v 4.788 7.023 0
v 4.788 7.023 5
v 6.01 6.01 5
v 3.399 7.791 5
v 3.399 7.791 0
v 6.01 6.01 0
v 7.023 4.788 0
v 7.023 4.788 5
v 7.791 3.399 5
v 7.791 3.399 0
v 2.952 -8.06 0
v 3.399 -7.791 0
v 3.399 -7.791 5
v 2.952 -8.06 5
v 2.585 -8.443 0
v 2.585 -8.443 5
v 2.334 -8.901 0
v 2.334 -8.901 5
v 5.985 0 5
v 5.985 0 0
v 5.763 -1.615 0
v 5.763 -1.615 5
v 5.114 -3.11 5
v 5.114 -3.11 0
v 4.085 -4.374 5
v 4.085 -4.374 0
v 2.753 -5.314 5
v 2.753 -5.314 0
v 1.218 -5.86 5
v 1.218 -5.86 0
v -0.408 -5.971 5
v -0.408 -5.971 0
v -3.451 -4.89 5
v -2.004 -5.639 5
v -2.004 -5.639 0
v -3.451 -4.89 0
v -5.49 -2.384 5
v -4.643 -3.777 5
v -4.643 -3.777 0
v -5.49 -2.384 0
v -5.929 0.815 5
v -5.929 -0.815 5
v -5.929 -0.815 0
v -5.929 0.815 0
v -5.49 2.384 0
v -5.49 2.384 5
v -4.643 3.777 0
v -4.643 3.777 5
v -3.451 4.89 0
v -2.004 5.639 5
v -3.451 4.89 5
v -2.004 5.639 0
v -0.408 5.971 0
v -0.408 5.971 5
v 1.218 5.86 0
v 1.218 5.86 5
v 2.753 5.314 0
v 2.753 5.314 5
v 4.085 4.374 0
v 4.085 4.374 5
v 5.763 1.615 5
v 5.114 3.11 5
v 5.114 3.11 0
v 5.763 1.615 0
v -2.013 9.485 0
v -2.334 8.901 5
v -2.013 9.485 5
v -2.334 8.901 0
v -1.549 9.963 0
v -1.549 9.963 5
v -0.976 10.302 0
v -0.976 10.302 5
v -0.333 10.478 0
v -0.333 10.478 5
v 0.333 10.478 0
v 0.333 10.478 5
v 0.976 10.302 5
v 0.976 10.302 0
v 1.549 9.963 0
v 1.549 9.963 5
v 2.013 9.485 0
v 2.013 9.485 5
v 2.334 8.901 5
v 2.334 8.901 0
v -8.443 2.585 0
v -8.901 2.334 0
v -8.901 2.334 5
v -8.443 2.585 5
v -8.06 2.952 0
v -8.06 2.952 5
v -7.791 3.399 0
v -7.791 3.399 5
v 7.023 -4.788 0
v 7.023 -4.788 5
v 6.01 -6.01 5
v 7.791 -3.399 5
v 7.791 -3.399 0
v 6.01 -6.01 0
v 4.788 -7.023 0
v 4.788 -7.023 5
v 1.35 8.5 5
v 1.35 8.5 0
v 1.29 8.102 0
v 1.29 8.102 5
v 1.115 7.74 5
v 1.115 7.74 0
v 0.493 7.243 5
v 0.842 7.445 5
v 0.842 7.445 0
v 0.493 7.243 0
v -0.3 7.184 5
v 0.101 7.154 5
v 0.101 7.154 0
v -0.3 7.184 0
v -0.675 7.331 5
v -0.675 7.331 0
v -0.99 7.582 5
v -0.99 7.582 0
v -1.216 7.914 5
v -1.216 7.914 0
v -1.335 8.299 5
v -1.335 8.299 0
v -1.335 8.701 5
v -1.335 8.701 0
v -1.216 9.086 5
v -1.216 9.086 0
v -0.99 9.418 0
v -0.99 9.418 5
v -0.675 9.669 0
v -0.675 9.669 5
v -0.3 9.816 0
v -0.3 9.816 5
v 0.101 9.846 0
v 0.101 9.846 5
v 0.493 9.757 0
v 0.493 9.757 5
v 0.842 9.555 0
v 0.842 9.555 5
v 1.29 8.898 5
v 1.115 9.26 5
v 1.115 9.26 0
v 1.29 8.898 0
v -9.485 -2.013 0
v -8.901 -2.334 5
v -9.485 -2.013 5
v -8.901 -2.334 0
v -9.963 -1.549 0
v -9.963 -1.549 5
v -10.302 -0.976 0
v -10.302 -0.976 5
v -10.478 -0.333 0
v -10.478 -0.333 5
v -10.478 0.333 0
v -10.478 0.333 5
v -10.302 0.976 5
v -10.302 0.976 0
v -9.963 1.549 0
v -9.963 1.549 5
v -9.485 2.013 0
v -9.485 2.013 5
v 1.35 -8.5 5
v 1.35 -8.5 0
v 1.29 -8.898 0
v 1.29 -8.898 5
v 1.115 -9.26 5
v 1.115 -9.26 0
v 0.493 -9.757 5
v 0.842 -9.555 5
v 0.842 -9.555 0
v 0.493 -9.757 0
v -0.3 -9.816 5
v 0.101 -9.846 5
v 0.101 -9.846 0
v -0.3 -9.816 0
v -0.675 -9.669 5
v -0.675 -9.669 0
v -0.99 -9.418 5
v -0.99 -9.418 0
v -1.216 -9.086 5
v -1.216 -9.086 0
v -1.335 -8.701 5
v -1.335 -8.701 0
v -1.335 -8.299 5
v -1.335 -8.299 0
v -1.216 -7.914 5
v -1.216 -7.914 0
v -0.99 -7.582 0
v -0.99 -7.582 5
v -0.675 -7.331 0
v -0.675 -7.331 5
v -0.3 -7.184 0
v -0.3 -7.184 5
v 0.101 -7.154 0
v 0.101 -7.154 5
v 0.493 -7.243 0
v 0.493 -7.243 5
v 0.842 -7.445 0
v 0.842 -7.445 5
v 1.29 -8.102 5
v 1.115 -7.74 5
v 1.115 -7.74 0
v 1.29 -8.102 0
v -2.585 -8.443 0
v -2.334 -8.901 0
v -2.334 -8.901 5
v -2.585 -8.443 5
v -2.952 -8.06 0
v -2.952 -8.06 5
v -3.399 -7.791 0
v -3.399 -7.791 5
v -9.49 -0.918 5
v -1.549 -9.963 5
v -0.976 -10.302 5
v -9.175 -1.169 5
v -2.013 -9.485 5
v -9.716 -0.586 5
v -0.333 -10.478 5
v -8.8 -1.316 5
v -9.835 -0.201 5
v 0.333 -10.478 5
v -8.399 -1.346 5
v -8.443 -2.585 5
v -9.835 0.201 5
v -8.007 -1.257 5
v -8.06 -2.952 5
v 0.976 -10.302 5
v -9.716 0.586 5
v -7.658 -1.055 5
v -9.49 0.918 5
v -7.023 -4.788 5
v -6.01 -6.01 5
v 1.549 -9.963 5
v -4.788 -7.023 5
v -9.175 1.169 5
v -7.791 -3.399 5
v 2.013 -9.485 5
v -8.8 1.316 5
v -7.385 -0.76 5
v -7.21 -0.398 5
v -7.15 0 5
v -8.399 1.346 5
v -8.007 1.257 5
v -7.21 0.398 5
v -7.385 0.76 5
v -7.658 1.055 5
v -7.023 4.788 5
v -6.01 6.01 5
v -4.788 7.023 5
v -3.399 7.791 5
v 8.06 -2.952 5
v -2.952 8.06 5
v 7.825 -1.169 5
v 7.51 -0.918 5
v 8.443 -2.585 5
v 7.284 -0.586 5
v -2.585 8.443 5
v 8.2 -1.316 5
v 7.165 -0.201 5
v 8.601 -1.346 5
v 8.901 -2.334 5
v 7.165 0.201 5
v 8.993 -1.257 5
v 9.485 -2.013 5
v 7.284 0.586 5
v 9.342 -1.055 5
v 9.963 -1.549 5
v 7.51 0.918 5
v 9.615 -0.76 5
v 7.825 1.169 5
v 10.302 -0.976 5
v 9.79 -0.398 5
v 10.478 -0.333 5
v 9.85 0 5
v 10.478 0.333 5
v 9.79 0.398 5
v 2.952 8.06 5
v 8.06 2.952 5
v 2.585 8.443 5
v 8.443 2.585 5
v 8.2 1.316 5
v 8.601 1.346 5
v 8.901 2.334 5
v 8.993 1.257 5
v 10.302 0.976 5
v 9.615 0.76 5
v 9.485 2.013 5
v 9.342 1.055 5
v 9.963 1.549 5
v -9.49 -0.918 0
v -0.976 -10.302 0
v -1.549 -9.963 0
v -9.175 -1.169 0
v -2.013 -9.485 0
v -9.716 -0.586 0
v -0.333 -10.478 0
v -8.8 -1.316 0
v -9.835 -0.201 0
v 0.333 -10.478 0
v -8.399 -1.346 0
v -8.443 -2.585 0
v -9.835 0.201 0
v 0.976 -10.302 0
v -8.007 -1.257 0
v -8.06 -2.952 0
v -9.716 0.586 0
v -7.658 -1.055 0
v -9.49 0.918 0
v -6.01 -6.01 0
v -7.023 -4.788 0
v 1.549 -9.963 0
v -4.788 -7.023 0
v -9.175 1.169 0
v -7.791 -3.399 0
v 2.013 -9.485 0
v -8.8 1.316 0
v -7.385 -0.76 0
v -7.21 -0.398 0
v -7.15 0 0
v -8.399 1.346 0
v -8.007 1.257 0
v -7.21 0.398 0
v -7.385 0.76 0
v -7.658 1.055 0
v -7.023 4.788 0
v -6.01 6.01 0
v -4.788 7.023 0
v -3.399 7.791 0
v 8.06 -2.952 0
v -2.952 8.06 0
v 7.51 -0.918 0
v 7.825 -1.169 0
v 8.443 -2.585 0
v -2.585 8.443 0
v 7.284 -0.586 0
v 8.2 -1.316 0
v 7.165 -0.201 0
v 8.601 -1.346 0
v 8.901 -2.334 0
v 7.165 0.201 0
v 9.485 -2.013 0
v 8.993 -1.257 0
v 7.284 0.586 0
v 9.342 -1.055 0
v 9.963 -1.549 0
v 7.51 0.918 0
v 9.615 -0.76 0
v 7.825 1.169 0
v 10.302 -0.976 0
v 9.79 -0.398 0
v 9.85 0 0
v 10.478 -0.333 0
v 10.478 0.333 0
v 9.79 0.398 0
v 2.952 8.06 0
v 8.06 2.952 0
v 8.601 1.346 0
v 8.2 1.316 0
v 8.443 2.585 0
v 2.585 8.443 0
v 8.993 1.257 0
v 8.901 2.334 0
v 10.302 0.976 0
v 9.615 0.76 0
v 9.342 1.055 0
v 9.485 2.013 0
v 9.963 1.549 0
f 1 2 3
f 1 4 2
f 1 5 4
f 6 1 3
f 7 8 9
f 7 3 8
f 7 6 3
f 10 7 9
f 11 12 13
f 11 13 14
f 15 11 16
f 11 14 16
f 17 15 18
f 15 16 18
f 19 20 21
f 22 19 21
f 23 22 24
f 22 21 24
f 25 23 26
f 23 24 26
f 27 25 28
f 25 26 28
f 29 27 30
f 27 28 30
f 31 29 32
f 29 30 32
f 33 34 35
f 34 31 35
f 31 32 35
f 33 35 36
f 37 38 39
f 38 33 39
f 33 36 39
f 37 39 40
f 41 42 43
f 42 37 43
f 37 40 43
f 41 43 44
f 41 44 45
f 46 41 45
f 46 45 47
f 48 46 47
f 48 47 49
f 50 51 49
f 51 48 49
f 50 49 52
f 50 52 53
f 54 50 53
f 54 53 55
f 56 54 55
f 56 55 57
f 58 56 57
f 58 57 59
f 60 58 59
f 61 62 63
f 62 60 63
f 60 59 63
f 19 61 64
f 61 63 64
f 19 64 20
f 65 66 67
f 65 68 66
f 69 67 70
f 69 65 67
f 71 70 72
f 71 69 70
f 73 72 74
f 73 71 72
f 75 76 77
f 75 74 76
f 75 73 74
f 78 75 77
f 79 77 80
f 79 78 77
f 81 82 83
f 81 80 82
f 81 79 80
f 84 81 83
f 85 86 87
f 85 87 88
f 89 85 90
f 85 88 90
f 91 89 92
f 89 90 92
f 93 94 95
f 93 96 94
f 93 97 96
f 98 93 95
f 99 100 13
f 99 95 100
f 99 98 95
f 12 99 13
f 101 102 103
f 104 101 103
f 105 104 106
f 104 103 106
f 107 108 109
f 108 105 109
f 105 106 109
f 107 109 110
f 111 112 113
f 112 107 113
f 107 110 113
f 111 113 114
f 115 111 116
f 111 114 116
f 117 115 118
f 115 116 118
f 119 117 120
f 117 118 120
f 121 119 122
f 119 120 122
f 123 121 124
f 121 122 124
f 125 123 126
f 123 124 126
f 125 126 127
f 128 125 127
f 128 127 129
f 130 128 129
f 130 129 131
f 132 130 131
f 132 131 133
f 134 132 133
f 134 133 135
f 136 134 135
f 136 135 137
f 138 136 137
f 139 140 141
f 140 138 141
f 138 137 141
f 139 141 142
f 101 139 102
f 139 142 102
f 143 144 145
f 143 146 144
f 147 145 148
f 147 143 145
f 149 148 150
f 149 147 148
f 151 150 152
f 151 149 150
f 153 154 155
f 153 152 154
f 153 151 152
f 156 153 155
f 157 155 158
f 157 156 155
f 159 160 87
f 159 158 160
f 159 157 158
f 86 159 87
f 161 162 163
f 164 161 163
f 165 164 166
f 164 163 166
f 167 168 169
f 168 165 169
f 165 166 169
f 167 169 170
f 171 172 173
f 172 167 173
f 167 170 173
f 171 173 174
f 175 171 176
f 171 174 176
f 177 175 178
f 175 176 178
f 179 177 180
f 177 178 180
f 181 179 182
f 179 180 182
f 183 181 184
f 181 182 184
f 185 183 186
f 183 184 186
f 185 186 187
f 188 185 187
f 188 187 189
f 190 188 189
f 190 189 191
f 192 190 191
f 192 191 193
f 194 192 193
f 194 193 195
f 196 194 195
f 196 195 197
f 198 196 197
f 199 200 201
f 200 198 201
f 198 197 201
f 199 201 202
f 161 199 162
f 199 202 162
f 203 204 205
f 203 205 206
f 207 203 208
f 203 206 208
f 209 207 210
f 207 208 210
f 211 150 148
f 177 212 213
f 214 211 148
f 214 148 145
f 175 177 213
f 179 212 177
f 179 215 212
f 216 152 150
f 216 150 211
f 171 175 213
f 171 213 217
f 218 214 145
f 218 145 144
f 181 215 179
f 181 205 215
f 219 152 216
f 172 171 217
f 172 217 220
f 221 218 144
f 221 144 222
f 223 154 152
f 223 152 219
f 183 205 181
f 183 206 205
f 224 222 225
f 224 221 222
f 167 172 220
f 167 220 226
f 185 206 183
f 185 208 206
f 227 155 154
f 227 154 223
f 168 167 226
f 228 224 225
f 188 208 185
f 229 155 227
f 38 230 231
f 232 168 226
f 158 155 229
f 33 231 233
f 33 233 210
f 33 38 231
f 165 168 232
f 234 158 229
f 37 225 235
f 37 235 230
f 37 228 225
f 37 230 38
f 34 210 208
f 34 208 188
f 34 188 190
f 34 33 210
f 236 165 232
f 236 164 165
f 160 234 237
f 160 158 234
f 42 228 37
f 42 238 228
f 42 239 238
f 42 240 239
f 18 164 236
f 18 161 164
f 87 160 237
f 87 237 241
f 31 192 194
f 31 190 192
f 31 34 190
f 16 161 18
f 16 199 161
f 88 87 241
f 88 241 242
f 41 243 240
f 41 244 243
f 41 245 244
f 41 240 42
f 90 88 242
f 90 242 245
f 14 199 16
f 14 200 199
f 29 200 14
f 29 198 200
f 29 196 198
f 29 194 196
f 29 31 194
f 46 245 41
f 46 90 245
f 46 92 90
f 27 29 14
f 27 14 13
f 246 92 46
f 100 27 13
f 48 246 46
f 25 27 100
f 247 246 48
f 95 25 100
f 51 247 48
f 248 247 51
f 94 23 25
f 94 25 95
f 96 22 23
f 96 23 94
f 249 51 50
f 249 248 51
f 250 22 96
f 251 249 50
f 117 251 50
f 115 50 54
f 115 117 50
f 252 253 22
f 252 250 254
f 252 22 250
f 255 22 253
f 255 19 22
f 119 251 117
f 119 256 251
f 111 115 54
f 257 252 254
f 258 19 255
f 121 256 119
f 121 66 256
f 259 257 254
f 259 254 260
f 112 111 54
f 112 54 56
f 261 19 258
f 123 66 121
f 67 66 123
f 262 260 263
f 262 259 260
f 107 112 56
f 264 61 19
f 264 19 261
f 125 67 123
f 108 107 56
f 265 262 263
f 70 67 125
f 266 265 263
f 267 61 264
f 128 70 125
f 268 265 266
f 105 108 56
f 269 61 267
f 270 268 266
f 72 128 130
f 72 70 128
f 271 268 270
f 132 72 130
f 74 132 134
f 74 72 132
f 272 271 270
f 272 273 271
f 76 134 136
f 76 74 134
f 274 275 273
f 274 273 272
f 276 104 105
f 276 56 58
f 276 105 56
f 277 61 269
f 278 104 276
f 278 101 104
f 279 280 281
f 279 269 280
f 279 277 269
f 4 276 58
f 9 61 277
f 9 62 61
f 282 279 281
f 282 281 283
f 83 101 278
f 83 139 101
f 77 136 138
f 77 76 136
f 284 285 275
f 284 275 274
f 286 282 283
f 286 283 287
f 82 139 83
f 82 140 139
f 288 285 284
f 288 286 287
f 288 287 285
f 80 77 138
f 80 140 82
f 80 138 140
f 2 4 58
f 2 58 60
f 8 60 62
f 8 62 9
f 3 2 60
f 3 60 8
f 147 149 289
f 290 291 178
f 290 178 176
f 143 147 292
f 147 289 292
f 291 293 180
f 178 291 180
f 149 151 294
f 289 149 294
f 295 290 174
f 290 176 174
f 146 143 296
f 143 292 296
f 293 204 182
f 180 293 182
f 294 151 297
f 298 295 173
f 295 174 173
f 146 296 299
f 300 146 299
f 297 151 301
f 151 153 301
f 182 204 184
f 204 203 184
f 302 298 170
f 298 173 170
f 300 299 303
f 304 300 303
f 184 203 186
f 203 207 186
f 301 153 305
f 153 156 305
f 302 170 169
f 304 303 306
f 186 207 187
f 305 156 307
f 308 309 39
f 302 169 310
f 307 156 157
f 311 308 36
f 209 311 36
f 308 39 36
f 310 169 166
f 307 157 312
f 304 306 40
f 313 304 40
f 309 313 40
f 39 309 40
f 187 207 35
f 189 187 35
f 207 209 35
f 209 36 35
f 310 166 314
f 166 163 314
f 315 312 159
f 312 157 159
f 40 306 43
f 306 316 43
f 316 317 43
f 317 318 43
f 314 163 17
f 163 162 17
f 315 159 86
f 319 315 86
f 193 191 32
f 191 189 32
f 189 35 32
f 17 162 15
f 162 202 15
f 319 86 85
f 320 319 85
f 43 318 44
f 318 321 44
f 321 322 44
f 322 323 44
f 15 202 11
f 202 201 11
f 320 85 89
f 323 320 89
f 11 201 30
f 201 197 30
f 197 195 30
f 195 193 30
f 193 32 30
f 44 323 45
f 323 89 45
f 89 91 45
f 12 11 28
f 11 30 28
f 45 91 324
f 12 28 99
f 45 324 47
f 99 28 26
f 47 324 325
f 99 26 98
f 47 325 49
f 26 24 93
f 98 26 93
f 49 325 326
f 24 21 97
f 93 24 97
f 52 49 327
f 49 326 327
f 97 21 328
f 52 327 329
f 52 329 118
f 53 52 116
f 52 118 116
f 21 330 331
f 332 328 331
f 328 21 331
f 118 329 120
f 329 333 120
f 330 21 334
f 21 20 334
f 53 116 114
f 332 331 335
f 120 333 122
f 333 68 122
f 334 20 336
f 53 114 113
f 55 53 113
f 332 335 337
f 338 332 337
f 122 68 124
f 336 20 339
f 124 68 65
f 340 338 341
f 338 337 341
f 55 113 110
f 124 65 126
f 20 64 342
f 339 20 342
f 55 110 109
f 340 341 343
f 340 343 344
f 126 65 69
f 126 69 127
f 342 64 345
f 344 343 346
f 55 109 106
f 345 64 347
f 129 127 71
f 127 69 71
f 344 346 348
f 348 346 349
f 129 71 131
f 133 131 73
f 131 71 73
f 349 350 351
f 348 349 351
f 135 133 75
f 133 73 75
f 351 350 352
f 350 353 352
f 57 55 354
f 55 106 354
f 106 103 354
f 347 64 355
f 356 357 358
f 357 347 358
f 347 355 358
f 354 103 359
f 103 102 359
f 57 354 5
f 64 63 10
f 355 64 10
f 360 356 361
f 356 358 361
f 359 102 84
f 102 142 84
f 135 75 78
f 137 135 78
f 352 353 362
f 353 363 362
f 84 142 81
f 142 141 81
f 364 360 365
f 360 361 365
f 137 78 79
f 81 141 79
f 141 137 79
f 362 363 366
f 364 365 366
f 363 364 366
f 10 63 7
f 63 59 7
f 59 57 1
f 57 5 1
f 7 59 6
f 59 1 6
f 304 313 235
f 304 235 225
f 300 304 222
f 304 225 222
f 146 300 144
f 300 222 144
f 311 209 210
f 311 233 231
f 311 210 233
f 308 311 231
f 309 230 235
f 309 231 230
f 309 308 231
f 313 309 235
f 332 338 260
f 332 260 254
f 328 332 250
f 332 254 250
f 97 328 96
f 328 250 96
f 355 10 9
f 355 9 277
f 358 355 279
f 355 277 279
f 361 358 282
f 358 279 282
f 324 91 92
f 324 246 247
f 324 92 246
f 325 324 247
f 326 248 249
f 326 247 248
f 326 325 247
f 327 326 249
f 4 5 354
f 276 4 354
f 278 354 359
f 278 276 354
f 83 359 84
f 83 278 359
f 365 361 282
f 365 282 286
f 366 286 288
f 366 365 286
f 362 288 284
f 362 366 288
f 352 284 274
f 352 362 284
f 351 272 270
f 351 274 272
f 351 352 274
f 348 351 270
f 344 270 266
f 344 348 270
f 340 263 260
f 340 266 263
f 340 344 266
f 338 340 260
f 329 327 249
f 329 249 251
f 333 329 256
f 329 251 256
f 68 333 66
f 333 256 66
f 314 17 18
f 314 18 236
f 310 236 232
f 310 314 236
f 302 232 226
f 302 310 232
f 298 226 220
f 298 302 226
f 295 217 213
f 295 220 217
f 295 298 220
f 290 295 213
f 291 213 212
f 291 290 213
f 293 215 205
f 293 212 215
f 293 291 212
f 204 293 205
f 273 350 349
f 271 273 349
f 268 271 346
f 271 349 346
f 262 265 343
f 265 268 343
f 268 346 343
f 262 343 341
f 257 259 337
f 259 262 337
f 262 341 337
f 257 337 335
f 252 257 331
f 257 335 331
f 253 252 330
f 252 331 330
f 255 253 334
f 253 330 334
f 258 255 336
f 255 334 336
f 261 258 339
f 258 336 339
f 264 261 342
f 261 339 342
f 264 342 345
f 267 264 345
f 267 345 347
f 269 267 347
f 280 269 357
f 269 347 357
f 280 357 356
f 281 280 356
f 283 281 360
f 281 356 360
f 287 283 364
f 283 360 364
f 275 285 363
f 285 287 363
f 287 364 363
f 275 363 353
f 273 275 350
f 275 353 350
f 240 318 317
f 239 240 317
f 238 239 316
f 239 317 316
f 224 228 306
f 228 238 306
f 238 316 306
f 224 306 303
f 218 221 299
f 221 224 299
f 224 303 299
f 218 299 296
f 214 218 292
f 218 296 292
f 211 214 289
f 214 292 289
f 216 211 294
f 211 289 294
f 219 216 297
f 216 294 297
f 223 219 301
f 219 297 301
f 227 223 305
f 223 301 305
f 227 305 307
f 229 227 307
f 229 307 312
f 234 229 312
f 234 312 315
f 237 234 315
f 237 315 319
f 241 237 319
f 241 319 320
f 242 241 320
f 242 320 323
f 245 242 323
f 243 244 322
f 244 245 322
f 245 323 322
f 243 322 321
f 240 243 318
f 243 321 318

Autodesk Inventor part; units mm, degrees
ref_plane "YZ Plane" through (0, 0, 0) normal (1, 0, 0) x (0, 1, 0)
ref_plane "XZ Plane" through (0, 0, 0) normal (0, 1, 0) x (-1, 0, 0)
ref_plane "XY Plane" through (0, 0, 0) normal (0, 0, 1) x (1, 0, 0)
sketch "スケッチ1" plane through (0, 0, 0) normal (0, 0, 1) x (1, 0, 0)
  circle A0 centre (0, 0) radius 5.985
  circle A1 centre (0, 8.5) radius 1.35
  line L0 (0, 8.5) -> (0, 0) construction
  circle A2 centre (0, 0) radius 8.5 construction
  circle A3 centre (0, 0) radius 10.5 construction
  arc A4 (2.5, 8.124) -> (-2.5, 8.124) centre (0, 7.9968) ccw
  arc A5 (-8.124, 2.5) -> (-8.124, -2.5) centre (-7.9968, 0) ccw
  circle A6 centre (-8.5, 0) radius 1.35
  arc A7 (-2.5, -8.124) -> (2.5, -8.124) centre (0, -7.9968) ccw
  circle A8 centre (0, -8.5) radius 1.35
  arc A9 (8.124, -2.5) -> (8.124, 2.5) centre (7.9968, 0) ccw
  circle A10 centre (8.5, 0) radius 1.35
  arc A11 (-2.5, 8.124) -> (-8.124, 2.5) centre (0, 0) ccw
  arc A12 (-8.124, -2.5) -> (-2.5, -8.124) centre (0, 0) ccw
  arc A13 (2.5, -8.124) -> (8.124, -2.5) centre (0, 0) ccw
  arc A14 (8.124, 2.5) -> (2.5, 8.124) centre (0, 0) ccw
  point P0 (0, 10.5)
  point P1 (-10.5, 0)
  point P2 (0, -10.5)
  point P3 (10.5, 0)
  dimension "d39" = 21
  dimension "d1" = 11.97
  dimension "d2" = 2.7
  dimension "d5" = 17
  dimension "d40" = 5
  dimension "d43" = 360
extrude "押し出し1" add sketch "スケッチ1" along normal blind 5
fillet "フィレット1" radius 2 8 edges at (-8.124, -2.5, 2.5) (-2.5, -8.124, 2.5) (2.5, -8.124, 2.5) (8.124, -2.5, 2.5) (8.124, 2.5, 2.5) (2.5, 8.124, 2.5) (-2.5, 8.124, 2.5) (-8.124, 2.5, 2.5)
properties part number "Knee_clamp" material "アルミニウム 2014-T4"
